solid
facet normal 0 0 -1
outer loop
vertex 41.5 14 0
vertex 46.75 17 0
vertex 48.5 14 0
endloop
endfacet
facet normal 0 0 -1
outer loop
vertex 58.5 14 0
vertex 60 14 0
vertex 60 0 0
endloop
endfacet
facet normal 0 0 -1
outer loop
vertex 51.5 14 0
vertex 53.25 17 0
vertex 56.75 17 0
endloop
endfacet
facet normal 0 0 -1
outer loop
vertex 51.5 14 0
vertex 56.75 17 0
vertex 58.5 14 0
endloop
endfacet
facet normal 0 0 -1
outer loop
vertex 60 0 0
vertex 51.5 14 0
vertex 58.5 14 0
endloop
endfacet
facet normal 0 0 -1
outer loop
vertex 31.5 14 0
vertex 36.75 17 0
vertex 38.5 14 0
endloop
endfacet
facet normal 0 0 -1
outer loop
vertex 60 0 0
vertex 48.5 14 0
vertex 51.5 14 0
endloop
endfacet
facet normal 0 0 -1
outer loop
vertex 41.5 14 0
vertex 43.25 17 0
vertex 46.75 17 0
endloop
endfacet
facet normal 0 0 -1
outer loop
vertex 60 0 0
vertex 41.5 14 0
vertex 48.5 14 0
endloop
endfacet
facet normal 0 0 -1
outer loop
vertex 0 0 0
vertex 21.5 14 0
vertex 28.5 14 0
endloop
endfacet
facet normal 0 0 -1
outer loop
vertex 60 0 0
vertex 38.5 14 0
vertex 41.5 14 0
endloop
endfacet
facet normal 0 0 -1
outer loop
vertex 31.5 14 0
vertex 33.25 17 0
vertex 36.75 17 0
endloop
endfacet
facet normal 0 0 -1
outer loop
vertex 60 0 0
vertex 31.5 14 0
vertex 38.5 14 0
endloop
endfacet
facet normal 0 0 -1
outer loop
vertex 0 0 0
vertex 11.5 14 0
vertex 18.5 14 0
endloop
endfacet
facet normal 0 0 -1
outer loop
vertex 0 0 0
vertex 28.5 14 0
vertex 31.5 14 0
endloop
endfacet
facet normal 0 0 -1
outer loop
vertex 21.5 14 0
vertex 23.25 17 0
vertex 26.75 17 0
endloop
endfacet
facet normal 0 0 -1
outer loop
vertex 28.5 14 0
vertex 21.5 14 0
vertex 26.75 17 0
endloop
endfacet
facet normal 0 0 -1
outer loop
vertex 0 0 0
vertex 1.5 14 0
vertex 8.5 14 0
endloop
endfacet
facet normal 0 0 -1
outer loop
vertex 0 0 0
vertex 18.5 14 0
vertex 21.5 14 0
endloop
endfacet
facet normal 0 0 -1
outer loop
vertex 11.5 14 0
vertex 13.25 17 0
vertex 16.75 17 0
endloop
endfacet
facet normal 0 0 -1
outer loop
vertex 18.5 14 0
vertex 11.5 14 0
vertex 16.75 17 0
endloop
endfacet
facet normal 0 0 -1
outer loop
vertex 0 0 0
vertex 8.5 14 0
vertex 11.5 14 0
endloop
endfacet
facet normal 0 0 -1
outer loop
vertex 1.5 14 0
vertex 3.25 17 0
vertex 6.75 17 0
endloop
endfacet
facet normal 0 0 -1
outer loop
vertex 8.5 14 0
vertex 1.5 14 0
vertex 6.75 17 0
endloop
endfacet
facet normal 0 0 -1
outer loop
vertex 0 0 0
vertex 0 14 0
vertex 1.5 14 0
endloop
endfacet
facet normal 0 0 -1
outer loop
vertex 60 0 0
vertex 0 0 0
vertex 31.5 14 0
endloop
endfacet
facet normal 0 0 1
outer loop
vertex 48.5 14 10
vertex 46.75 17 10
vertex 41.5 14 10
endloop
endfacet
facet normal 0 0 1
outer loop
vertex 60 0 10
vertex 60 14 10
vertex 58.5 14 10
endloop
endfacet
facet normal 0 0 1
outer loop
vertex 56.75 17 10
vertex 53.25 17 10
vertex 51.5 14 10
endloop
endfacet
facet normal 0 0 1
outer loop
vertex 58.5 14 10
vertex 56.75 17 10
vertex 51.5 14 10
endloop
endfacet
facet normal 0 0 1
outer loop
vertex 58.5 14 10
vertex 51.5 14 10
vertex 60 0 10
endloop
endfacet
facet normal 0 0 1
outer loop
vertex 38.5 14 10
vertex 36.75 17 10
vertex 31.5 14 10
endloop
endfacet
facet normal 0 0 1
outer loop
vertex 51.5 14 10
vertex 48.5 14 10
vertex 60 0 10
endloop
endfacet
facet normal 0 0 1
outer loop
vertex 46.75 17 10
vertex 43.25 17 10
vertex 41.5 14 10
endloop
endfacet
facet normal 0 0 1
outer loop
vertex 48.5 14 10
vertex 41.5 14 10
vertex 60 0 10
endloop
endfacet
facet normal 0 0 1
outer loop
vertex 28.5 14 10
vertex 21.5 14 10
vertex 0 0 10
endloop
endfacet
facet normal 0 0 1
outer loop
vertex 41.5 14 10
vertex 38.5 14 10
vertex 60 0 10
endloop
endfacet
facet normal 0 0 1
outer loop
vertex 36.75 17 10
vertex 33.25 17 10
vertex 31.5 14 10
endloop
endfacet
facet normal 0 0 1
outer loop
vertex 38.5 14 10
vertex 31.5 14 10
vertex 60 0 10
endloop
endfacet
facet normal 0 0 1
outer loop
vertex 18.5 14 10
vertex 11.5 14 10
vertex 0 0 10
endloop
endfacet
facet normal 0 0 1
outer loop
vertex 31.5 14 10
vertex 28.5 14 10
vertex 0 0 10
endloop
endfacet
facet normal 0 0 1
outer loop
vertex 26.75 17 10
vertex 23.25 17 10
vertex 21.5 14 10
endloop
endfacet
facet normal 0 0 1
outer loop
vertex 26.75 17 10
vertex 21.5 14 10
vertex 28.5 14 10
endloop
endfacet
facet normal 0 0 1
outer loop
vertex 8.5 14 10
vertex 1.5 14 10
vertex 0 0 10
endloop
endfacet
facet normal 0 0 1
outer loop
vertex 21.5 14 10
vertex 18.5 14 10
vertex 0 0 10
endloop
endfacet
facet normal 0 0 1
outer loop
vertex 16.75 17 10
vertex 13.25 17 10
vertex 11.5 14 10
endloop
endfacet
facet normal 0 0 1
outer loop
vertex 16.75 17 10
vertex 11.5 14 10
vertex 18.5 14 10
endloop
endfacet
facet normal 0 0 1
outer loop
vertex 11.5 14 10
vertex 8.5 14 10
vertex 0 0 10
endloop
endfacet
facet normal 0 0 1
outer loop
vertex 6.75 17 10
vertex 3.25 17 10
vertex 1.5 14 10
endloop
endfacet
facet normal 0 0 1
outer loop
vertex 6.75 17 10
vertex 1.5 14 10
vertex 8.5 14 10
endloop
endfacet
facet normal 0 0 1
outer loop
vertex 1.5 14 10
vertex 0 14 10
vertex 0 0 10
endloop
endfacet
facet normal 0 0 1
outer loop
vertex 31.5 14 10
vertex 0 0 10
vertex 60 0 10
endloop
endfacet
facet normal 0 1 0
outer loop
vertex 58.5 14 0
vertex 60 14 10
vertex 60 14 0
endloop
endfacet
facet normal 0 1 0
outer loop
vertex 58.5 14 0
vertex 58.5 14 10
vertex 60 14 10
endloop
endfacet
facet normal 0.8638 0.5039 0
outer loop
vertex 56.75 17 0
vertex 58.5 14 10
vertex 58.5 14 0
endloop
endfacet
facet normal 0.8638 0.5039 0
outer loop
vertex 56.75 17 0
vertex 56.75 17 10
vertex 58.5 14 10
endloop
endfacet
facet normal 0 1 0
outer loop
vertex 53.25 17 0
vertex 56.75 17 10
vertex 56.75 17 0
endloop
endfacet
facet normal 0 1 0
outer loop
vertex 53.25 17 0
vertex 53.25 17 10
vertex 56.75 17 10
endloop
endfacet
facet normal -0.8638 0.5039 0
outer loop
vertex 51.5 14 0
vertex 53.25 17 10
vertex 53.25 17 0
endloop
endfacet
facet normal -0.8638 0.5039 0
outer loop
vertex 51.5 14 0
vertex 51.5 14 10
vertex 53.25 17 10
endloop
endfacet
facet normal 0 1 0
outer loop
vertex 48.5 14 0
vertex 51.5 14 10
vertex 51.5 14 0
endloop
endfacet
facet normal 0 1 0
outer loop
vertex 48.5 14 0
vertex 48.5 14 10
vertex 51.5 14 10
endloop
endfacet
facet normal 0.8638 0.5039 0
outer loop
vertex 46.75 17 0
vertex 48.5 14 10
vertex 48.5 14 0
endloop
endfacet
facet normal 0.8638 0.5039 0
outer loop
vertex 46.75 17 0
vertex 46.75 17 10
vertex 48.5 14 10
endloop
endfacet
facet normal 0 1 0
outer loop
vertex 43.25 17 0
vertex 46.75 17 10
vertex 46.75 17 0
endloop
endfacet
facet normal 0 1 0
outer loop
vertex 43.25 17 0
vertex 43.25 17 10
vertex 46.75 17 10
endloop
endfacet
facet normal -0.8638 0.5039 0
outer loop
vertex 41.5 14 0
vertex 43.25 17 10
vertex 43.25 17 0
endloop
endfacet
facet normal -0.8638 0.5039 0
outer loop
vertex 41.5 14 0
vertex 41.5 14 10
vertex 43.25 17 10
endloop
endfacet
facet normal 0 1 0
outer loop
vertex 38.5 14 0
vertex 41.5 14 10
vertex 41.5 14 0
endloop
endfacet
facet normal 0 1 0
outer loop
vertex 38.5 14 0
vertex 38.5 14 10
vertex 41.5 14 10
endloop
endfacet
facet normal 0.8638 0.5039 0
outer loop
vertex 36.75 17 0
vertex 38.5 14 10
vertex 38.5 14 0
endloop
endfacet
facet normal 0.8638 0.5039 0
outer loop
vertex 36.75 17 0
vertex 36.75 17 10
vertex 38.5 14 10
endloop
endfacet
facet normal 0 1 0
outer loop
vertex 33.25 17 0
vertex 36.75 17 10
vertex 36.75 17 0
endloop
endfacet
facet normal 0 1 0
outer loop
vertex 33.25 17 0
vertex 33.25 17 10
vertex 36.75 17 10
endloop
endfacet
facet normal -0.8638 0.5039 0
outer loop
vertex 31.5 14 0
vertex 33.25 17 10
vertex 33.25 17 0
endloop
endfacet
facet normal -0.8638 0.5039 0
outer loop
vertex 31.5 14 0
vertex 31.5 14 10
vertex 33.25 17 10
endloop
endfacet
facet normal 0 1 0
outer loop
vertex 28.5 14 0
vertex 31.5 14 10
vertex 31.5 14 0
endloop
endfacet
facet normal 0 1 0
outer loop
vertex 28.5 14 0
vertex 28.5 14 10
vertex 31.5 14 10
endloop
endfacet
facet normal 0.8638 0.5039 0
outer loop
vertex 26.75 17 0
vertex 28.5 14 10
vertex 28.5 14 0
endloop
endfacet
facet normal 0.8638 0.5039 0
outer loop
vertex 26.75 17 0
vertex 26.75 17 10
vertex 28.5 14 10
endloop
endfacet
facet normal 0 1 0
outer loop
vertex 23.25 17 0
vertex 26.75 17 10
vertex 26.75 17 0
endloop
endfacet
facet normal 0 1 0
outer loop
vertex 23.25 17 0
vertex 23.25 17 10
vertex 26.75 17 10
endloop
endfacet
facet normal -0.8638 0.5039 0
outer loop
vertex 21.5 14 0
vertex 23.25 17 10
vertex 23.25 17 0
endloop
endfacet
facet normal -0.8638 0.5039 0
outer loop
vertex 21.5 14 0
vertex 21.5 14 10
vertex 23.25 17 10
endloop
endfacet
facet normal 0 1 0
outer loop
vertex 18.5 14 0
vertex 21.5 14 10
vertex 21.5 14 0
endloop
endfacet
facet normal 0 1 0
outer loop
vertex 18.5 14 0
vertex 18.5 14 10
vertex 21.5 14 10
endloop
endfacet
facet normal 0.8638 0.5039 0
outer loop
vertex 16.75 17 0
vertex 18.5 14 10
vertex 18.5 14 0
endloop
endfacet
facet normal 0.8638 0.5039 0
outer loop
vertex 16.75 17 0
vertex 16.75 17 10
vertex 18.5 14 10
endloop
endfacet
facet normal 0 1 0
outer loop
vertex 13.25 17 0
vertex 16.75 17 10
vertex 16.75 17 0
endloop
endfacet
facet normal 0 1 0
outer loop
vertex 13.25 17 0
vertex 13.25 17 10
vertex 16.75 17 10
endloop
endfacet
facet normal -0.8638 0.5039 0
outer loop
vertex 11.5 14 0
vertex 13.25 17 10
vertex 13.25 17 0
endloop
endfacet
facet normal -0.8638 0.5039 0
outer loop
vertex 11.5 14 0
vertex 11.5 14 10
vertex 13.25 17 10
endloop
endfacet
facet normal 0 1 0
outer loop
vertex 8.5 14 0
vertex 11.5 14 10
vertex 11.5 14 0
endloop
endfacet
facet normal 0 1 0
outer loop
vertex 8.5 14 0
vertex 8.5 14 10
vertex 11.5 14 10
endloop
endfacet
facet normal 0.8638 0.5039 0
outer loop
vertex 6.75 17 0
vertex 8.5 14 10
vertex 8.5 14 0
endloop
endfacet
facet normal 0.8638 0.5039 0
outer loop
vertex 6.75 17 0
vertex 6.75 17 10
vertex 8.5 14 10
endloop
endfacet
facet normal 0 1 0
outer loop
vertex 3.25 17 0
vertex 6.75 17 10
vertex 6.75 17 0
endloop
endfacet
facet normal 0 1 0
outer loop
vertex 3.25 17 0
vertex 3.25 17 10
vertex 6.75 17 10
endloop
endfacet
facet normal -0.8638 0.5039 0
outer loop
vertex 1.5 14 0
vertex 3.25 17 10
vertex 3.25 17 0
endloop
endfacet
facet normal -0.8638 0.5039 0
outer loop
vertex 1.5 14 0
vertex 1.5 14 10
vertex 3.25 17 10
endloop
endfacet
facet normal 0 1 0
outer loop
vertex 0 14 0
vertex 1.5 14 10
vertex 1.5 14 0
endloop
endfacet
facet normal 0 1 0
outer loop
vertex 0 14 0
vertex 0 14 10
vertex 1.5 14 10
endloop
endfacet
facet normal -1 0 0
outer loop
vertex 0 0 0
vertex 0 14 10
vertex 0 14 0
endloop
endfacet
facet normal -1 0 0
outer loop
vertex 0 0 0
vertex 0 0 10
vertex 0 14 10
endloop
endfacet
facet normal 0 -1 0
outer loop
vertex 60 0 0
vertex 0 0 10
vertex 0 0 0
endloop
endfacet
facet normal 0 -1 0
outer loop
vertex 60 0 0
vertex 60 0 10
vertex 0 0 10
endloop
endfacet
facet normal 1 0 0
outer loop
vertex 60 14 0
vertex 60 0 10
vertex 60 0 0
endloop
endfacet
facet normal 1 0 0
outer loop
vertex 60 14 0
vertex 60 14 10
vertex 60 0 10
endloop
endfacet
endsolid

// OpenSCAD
$fn = 32;

// ----------------------------------------------------------------------
// Gear rack: 6 teeth, pitch 10 mm
// ----------------------------------------------------------------------

// --- parameters (mm) ---
teeth = 6;                // number of teeth
pitch = 10;               // tooth pitch, X
root_w = 7;               // tooth width at the root
tip_w = 3.5;              // tooth width at the tip
base_h = 14;              // rack body height, Y
tooth_h = 3;              // tooth height above the body
plate_t = 10;             // rack width, Z (extrusion height)

rack_l = teeth * pitch;  // overall length
total_h = base_h + tooth_h;  // overall height

profile = [[0, 0], [60, 0], [60, 14], [58.5, 14], [56.75, 17], [53.25, 17], [51.5, 14], [48.5, 14], [46.75, 17], [43.25, 17], [41.5, 14], [38.5, 14], [36.75, 17], [33.25, 17], [31.5, 14], [28.5, 14], [26.75, 17], [23.25, 17], [21.5, 14], [18.5, 14], [16.75, 17], [13.25, 17], [11.5, 14], [8.5, 14], [6.75, 17], [3.25, 17], [1.5, 14], [0, 14]];  // primary outline, 28 points, counter clockwise

// --- the one profile operation ---
linear_extrude(height = plate_t) polygon(points = profile);
